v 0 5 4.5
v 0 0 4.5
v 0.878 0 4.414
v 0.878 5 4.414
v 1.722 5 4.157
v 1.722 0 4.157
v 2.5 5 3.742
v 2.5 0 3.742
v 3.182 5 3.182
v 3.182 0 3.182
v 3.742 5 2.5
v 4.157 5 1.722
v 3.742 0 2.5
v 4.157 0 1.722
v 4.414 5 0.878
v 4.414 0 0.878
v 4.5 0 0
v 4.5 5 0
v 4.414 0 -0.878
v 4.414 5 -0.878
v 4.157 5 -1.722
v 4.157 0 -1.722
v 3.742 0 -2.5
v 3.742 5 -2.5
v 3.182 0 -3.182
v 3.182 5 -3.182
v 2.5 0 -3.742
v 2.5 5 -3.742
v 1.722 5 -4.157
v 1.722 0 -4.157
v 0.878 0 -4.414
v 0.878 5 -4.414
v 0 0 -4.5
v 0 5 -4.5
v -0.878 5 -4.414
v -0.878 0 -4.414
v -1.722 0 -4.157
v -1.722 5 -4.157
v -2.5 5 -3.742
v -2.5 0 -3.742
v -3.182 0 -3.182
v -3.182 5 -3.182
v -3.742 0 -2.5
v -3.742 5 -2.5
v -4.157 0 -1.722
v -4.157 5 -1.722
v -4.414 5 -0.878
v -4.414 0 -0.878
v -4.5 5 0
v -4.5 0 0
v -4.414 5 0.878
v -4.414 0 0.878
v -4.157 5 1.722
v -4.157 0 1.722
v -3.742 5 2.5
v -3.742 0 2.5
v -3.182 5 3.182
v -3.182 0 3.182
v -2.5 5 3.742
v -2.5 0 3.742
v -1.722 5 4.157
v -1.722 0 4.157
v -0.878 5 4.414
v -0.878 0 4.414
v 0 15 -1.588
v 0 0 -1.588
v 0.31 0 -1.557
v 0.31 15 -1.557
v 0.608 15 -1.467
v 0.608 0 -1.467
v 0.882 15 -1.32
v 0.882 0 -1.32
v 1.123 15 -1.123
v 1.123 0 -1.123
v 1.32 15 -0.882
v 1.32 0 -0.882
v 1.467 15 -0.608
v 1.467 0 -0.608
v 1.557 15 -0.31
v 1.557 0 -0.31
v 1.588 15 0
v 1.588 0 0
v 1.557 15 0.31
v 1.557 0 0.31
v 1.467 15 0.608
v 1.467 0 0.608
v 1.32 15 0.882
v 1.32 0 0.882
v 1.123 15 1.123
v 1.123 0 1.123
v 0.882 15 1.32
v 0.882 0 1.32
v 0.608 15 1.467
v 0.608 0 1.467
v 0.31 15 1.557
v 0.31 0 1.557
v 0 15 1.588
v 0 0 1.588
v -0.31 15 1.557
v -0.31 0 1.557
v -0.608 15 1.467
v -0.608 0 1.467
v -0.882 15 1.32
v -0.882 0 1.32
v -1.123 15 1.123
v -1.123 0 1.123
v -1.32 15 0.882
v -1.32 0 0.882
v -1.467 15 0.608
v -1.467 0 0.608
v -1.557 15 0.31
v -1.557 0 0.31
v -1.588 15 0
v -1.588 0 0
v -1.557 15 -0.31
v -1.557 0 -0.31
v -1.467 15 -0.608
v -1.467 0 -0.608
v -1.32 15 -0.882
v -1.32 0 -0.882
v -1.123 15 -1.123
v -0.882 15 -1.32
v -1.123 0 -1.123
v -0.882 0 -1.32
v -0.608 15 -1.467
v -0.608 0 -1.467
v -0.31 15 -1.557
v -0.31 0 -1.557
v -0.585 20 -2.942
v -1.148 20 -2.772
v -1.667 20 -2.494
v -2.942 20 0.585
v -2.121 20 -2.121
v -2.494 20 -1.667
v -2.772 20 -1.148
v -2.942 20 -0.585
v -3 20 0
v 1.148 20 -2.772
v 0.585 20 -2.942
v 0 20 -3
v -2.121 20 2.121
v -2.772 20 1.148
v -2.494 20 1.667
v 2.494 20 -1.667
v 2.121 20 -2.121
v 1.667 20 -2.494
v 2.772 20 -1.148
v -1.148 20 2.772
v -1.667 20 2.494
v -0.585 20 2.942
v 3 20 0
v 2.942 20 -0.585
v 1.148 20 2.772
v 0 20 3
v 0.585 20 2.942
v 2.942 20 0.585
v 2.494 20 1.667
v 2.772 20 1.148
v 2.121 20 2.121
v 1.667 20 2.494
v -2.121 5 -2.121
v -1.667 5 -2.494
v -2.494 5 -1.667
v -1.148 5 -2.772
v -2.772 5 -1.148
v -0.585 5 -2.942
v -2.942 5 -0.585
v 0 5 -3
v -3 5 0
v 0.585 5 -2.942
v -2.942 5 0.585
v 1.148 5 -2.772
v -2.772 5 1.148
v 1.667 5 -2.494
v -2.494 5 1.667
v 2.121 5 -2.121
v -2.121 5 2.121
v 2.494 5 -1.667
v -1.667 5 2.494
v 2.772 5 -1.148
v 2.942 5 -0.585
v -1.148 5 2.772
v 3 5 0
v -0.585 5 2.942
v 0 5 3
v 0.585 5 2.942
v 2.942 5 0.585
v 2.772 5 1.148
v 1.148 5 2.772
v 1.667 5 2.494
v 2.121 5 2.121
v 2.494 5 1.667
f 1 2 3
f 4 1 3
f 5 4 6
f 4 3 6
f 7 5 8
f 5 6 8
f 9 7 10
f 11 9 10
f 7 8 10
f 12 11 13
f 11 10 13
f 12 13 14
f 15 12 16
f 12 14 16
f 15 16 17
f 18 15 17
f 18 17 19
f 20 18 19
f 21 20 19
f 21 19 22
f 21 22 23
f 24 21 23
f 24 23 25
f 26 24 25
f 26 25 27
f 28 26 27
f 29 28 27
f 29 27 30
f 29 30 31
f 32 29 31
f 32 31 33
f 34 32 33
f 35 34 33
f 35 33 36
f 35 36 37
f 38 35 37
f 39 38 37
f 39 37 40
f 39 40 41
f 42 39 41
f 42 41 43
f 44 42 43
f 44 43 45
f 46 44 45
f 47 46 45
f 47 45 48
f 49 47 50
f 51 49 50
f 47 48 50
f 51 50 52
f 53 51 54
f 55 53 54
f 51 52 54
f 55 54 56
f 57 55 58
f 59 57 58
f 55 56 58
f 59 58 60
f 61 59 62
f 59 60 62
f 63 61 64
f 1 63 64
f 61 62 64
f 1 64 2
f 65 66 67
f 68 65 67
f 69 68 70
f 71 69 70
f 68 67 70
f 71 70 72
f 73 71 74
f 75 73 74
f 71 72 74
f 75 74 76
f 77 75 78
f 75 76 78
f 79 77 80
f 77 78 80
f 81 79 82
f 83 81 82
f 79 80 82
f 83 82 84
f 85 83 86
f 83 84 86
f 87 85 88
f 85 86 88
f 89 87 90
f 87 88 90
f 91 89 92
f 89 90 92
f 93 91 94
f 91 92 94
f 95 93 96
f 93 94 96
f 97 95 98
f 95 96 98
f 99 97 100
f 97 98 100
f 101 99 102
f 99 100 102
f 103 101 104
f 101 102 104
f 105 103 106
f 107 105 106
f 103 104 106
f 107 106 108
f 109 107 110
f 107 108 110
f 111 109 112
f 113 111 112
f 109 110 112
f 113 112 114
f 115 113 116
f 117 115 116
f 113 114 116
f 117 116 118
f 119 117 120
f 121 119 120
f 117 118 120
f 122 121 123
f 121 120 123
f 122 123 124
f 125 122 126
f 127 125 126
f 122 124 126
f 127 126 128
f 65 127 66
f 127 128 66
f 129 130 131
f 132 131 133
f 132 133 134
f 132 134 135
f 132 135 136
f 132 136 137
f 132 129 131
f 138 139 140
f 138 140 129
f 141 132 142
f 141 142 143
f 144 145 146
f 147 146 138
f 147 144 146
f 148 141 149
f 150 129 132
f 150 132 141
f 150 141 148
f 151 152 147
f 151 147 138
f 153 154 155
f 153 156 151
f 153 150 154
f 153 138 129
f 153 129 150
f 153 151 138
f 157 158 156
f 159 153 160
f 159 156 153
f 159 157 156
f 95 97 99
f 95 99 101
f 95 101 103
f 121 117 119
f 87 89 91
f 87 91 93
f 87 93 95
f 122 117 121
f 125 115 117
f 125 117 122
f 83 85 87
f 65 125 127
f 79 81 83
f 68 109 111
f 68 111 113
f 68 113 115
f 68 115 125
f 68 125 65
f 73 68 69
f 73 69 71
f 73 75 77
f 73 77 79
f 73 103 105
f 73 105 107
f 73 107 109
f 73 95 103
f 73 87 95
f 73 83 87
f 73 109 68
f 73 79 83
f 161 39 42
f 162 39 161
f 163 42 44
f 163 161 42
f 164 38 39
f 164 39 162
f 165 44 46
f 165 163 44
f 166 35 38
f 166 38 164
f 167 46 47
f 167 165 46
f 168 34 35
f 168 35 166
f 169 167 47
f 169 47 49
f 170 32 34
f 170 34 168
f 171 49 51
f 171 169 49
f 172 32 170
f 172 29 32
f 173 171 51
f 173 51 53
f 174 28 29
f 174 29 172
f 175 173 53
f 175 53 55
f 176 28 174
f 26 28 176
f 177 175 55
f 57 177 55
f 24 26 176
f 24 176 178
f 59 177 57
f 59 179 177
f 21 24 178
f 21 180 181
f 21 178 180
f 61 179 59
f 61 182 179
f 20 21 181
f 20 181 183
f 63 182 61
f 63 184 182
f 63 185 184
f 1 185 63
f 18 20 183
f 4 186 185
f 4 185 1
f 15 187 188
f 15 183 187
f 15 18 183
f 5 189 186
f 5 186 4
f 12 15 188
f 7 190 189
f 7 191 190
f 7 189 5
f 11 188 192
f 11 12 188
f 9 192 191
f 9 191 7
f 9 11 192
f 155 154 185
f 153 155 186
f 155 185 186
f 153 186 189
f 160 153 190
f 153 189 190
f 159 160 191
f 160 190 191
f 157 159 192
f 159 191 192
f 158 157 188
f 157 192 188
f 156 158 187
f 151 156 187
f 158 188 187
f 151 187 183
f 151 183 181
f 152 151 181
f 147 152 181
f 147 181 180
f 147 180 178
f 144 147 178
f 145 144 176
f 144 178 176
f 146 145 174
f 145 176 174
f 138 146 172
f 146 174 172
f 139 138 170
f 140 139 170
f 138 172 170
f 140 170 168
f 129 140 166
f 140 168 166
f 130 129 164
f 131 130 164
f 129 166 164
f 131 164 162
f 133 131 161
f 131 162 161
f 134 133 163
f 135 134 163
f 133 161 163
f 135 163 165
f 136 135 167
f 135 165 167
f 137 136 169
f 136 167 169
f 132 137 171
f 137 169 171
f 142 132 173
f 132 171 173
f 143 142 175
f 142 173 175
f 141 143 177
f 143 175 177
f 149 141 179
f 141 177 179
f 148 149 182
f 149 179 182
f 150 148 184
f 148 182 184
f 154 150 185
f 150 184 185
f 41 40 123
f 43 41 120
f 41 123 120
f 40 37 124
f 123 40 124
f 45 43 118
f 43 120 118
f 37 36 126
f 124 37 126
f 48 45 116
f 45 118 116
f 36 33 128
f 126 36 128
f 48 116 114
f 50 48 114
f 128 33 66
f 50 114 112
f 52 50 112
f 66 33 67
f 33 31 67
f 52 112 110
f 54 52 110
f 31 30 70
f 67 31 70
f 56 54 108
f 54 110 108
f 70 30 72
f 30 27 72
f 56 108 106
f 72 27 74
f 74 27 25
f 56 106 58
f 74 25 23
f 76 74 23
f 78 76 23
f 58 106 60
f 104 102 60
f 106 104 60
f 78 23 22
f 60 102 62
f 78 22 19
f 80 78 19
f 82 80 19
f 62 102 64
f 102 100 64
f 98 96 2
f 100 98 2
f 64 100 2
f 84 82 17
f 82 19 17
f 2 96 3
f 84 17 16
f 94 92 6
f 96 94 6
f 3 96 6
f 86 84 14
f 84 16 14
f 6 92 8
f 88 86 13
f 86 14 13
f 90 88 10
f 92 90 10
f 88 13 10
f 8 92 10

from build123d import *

# Parameters (mm, degrees)
SKETCH_1_R          = 4.5
EXTRUDE_1_DEPTH     = 20
CUT_EXTRUDE_START   = -15
SKETCH_2_R          = 4.5
SKETCH_2_R_2        = 3
CUT_EXTRUDE_1_DEPTH = 15
SKETCH_3_R          = 1.5875
CUT_EXTRUDE_2_DEPTH = 15


with BuildPart() as part:
    # Эскиз1 → Бобышка-Вытянуть1 (new body)
    with BuildSketch(Plane(origin=(0, 0, 0), x_dir=(1, 0, 0), z_dir=(0, 1, 0))):
        with Locations(Location((0, 0, 0), (0, 0, 270))):
            Circle(SKETCH_1_R)
    extrude(amount=EXTRUDE_1_DEPTH)

    # Эскиз2 → Вырез-Вытянуть1 (cut)
    with BuildSketch(Plane(origin=(0, 20, 0), x_dir=(1, 0, 0), z_dir=(0, 1, 0)).offset(CUT_EXTRUDE_START)):
        with Locations(Location((0, 0, 0), (0, 0, 270))):
            Circle(SKETCH_2_R)
        with Locations(Location((0, 0, 0), (0, 0, 270))):
            Circle(SKETCH_2_R_2, mode=Mode.SUBTRACT)
    extrude(amount=CUT_EXTRUDE_1_DEPTH, mode=Mode.SUBTRACT)

    # Эскиз3 → Вырез-Вытянуть2 (cut)
    with BuildSketch(Plane.XZ):
        with Locations(Location((0, 0, 0), (0, 0, 270))):
            Circle(SKETCH_3_R)
    extrude(amount=-CUT_EXTRUDE_2_DEPTH, mode=Mode.SUBTRACT)


solid = part.part
